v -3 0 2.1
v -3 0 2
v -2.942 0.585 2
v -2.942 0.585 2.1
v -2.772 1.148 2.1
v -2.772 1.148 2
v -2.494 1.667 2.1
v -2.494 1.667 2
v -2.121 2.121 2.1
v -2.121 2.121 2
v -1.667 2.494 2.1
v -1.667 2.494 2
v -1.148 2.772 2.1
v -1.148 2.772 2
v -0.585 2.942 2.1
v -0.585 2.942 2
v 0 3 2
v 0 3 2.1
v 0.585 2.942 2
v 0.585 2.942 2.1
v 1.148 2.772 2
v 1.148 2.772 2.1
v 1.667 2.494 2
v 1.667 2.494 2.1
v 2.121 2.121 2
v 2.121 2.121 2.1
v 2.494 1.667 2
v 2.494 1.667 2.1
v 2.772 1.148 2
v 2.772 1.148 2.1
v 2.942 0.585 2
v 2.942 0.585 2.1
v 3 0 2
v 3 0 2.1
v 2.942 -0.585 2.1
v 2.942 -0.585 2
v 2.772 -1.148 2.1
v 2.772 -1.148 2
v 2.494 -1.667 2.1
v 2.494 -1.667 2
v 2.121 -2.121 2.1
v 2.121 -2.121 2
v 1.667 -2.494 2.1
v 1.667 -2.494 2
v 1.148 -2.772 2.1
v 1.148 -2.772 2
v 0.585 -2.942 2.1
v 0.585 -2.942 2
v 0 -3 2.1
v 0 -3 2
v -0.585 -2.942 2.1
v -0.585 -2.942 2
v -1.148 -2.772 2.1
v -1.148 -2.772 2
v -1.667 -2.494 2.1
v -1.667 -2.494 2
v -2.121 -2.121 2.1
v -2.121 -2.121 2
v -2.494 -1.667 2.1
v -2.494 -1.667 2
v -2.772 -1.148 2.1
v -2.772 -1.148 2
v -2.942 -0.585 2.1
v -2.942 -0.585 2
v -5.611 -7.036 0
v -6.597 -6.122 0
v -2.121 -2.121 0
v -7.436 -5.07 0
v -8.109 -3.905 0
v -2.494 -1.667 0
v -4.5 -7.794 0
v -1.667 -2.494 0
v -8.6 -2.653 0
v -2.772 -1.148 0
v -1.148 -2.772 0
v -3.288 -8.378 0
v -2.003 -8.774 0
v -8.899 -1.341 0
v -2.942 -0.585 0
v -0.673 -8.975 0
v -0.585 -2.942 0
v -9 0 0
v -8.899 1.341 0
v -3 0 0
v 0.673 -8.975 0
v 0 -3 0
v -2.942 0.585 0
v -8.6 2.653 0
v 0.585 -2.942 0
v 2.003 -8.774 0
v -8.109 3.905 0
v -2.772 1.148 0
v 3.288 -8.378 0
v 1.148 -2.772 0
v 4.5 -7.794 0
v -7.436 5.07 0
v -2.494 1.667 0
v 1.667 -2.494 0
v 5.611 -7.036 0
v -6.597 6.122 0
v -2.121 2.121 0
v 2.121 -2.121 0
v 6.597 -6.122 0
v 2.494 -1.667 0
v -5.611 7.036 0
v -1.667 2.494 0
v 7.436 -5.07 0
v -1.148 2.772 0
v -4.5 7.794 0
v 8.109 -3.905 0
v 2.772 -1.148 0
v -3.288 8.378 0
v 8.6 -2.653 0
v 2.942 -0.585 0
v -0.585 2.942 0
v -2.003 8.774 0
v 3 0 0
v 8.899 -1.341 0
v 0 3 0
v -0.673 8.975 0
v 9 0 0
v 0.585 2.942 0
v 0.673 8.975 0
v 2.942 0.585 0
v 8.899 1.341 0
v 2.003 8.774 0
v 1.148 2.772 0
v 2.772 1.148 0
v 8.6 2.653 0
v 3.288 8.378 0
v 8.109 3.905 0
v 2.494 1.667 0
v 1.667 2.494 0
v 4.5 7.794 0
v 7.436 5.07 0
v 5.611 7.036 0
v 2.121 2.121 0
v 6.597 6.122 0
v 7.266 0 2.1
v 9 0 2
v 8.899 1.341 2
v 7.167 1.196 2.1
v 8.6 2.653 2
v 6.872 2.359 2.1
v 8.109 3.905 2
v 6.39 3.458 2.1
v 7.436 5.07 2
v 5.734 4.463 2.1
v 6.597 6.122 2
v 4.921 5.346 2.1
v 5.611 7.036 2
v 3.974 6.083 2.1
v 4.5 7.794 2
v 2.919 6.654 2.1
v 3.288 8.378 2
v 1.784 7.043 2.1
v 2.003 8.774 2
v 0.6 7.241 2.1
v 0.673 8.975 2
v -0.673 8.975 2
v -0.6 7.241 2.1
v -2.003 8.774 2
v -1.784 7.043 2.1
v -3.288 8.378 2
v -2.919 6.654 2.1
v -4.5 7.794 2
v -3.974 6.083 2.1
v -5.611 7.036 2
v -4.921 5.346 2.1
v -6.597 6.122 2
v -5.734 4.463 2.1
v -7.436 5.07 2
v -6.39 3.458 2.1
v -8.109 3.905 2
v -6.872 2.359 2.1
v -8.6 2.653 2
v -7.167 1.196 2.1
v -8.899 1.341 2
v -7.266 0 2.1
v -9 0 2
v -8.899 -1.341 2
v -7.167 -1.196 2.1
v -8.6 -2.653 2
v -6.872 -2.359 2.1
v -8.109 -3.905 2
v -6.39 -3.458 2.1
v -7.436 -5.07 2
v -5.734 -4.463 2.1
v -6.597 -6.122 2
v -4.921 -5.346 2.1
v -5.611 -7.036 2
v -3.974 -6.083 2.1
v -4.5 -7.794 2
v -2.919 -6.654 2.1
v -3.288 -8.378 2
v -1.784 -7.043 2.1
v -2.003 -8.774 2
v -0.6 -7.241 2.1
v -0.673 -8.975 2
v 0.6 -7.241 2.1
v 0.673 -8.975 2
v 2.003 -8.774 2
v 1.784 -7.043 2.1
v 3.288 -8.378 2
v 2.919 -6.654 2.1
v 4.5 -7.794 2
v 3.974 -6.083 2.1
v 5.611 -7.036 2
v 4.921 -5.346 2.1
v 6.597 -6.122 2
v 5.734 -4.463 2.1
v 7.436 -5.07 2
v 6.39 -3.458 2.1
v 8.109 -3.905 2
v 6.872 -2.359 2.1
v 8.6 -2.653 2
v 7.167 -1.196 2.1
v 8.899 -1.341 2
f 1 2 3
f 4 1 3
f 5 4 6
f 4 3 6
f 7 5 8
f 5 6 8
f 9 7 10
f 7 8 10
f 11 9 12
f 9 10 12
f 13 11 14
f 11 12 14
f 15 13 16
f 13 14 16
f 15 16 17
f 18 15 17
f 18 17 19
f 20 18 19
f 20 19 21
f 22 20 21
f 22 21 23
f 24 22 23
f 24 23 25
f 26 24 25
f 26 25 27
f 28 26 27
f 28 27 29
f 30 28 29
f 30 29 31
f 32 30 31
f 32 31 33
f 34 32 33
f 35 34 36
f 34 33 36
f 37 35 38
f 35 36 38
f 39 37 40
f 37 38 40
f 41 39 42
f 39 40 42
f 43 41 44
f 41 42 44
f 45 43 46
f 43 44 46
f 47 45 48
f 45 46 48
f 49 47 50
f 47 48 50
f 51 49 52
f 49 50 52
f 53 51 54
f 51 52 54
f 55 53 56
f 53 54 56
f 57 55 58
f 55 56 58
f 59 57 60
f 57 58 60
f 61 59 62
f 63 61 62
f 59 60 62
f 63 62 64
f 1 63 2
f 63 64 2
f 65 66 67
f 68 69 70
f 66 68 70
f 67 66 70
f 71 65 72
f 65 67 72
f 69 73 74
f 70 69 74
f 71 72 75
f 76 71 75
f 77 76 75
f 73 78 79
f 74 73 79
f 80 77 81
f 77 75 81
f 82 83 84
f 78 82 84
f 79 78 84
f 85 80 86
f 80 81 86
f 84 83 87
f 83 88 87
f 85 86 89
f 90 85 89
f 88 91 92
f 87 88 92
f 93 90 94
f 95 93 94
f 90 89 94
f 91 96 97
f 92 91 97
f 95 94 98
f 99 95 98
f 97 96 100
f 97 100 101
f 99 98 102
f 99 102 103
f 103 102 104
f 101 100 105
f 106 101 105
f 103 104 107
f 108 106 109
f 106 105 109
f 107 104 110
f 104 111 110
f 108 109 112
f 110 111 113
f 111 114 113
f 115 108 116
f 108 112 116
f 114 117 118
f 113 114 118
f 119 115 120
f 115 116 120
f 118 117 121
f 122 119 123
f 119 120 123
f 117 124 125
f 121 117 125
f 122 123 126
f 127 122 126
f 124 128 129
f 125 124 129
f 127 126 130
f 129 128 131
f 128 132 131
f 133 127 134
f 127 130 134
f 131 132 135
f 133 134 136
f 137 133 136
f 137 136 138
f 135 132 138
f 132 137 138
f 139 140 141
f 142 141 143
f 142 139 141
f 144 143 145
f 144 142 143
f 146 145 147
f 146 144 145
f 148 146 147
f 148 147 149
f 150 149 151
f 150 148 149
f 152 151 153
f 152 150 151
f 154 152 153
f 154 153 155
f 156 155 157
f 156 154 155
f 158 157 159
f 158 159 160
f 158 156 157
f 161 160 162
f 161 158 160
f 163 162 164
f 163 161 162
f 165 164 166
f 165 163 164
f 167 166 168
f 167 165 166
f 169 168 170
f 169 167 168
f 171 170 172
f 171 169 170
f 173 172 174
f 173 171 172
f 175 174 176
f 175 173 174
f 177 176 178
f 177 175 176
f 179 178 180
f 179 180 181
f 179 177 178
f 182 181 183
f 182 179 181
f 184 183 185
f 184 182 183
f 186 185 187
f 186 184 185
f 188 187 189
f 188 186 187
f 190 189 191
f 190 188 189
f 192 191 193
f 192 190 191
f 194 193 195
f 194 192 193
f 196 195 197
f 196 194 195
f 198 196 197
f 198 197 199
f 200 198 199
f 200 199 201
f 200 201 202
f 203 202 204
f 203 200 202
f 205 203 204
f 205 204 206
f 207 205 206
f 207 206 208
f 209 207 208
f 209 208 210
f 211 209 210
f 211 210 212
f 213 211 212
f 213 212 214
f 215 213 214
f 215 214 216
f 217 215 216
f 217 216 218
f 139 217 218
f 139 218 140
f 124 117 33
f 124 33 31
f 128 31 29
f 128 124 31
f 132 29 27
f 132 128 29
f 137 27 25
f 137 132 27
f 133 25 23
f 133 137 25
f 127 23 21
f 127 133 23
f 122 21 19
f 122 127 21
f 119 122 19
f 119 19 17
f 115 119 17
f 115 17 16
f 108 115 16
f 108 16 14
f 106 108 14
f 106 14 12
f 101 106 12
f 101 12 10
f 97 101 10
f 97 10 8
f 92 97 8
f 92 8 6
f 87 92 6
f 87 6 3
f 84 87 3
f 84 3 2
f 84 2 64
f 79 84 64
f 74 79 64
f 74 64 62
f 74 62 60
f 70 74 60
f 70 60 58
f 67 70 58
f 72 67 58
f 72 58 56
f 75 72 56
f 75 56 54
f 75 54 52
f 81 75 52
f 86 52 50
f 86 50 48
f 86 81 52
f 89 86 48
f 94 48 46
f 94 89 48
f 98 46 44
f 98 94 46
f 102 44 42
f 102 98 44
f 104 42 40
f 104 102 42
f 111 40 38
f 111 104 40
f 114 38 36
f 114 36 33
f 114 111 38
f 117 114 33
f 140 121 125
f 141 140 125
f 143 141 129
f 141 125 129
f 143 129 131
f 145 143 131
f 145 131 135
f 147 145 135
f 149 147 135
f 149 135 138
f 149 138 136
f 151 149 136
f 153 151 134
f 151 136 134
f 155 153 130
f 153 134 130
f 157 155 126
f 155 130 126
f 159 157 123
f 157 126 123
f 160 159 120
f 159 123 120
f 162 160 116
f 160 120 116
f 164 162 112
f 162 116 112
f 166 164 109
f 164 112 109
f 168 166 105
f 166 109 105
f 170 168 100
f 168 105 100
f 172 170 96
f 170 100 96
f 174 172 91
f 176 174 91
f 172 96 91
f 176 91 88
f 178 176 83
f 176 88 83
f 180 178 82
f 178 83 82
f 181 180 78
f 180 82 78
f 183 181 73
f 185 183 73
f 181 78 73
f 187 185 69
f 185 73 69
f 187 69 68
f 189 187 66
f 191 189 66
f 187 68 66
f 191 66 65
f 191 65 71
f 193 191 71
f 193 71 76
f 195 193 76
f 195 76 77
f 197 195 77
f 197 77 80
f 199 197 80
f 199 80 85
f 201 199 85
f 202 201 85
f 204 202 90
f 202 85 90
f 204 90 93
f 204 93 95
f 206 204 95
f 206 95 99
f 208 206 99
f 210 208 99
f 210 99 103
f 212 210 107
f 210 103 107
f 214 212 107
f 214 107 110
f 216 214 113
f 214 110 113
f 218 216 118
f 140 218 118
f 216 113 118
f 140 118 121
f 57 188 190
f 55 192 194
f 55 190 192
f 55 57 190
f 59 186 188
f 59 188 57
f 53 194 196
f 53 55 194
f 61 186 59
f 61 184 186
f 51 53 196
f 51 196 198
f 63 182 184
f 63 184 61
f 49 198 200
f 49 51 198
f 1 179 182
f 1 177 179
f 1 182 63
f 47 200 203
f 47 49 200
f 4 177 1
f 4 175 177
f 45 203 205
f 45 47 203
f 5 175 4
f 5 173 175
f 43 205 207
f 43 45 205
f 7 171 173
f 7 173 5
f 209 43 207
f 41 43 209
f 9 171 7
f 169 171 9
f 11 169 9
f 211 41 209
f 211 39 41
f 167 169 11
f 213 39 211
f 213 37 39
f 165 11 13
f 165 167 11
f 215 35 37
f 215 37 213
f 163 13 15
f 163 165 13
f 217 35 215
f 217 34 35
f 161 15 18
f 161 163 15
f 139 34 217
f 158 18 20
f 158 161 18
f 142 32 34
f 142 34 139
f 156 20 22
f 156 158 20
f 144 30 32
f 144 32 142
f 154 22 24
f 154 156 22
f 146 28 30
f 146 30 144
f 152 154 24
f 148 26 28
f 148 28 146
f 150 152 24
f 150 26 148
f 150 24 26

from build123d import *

# Parameters (mm, degrees)
SKETCH2_R           = 9
SKETCH2_R_2         = 3
BOSS_EXTRUDE1_DEPTH = 2
SKETCH4_R           = 9
BOSS_EXTRUDE2_DEPTH = 0.1
BOSS_EXTRUDE2_TAPER = 86.7
SKETCH5_R           = 3
CUT_EXTRUDE1_DEPTH  = 0.1


with BuildPart() as part:
    # Sketch2 → Boss-Extrude1 (new body)
    with BuildSketch(Plane.XY):
        Circle(SKETCH2_R)
        Circle(SKETCH2_R_2, mode=Mode.SUBTRACT)
    extrude(amount=BOSS_EXTRUDE1_DEPTH)

    # Sketch4 → Boss-Extrude2 (add)
    with BuildSketch(Plane.XY.offset(2)):
        Circle(SKETCH4_R)
    extrude(amount=BOSS_EXTRUDE2_DEPTH, taper=BOSS_EXTRUDE2_TAPER)

    # Sketch5 → Cut-Extrude1 (cut)
    with BuildSketch(Plane(origin=(0, 0, 2), x_dir=(-1, 0, 0), z_dir=(0, 0, -1))):
        Circle(SKETCH5_R)
    extrude(amount=-CUT_EXTRUDE1_DEPTH, mode=Mode.SUBTRACT)


solid = part.part
